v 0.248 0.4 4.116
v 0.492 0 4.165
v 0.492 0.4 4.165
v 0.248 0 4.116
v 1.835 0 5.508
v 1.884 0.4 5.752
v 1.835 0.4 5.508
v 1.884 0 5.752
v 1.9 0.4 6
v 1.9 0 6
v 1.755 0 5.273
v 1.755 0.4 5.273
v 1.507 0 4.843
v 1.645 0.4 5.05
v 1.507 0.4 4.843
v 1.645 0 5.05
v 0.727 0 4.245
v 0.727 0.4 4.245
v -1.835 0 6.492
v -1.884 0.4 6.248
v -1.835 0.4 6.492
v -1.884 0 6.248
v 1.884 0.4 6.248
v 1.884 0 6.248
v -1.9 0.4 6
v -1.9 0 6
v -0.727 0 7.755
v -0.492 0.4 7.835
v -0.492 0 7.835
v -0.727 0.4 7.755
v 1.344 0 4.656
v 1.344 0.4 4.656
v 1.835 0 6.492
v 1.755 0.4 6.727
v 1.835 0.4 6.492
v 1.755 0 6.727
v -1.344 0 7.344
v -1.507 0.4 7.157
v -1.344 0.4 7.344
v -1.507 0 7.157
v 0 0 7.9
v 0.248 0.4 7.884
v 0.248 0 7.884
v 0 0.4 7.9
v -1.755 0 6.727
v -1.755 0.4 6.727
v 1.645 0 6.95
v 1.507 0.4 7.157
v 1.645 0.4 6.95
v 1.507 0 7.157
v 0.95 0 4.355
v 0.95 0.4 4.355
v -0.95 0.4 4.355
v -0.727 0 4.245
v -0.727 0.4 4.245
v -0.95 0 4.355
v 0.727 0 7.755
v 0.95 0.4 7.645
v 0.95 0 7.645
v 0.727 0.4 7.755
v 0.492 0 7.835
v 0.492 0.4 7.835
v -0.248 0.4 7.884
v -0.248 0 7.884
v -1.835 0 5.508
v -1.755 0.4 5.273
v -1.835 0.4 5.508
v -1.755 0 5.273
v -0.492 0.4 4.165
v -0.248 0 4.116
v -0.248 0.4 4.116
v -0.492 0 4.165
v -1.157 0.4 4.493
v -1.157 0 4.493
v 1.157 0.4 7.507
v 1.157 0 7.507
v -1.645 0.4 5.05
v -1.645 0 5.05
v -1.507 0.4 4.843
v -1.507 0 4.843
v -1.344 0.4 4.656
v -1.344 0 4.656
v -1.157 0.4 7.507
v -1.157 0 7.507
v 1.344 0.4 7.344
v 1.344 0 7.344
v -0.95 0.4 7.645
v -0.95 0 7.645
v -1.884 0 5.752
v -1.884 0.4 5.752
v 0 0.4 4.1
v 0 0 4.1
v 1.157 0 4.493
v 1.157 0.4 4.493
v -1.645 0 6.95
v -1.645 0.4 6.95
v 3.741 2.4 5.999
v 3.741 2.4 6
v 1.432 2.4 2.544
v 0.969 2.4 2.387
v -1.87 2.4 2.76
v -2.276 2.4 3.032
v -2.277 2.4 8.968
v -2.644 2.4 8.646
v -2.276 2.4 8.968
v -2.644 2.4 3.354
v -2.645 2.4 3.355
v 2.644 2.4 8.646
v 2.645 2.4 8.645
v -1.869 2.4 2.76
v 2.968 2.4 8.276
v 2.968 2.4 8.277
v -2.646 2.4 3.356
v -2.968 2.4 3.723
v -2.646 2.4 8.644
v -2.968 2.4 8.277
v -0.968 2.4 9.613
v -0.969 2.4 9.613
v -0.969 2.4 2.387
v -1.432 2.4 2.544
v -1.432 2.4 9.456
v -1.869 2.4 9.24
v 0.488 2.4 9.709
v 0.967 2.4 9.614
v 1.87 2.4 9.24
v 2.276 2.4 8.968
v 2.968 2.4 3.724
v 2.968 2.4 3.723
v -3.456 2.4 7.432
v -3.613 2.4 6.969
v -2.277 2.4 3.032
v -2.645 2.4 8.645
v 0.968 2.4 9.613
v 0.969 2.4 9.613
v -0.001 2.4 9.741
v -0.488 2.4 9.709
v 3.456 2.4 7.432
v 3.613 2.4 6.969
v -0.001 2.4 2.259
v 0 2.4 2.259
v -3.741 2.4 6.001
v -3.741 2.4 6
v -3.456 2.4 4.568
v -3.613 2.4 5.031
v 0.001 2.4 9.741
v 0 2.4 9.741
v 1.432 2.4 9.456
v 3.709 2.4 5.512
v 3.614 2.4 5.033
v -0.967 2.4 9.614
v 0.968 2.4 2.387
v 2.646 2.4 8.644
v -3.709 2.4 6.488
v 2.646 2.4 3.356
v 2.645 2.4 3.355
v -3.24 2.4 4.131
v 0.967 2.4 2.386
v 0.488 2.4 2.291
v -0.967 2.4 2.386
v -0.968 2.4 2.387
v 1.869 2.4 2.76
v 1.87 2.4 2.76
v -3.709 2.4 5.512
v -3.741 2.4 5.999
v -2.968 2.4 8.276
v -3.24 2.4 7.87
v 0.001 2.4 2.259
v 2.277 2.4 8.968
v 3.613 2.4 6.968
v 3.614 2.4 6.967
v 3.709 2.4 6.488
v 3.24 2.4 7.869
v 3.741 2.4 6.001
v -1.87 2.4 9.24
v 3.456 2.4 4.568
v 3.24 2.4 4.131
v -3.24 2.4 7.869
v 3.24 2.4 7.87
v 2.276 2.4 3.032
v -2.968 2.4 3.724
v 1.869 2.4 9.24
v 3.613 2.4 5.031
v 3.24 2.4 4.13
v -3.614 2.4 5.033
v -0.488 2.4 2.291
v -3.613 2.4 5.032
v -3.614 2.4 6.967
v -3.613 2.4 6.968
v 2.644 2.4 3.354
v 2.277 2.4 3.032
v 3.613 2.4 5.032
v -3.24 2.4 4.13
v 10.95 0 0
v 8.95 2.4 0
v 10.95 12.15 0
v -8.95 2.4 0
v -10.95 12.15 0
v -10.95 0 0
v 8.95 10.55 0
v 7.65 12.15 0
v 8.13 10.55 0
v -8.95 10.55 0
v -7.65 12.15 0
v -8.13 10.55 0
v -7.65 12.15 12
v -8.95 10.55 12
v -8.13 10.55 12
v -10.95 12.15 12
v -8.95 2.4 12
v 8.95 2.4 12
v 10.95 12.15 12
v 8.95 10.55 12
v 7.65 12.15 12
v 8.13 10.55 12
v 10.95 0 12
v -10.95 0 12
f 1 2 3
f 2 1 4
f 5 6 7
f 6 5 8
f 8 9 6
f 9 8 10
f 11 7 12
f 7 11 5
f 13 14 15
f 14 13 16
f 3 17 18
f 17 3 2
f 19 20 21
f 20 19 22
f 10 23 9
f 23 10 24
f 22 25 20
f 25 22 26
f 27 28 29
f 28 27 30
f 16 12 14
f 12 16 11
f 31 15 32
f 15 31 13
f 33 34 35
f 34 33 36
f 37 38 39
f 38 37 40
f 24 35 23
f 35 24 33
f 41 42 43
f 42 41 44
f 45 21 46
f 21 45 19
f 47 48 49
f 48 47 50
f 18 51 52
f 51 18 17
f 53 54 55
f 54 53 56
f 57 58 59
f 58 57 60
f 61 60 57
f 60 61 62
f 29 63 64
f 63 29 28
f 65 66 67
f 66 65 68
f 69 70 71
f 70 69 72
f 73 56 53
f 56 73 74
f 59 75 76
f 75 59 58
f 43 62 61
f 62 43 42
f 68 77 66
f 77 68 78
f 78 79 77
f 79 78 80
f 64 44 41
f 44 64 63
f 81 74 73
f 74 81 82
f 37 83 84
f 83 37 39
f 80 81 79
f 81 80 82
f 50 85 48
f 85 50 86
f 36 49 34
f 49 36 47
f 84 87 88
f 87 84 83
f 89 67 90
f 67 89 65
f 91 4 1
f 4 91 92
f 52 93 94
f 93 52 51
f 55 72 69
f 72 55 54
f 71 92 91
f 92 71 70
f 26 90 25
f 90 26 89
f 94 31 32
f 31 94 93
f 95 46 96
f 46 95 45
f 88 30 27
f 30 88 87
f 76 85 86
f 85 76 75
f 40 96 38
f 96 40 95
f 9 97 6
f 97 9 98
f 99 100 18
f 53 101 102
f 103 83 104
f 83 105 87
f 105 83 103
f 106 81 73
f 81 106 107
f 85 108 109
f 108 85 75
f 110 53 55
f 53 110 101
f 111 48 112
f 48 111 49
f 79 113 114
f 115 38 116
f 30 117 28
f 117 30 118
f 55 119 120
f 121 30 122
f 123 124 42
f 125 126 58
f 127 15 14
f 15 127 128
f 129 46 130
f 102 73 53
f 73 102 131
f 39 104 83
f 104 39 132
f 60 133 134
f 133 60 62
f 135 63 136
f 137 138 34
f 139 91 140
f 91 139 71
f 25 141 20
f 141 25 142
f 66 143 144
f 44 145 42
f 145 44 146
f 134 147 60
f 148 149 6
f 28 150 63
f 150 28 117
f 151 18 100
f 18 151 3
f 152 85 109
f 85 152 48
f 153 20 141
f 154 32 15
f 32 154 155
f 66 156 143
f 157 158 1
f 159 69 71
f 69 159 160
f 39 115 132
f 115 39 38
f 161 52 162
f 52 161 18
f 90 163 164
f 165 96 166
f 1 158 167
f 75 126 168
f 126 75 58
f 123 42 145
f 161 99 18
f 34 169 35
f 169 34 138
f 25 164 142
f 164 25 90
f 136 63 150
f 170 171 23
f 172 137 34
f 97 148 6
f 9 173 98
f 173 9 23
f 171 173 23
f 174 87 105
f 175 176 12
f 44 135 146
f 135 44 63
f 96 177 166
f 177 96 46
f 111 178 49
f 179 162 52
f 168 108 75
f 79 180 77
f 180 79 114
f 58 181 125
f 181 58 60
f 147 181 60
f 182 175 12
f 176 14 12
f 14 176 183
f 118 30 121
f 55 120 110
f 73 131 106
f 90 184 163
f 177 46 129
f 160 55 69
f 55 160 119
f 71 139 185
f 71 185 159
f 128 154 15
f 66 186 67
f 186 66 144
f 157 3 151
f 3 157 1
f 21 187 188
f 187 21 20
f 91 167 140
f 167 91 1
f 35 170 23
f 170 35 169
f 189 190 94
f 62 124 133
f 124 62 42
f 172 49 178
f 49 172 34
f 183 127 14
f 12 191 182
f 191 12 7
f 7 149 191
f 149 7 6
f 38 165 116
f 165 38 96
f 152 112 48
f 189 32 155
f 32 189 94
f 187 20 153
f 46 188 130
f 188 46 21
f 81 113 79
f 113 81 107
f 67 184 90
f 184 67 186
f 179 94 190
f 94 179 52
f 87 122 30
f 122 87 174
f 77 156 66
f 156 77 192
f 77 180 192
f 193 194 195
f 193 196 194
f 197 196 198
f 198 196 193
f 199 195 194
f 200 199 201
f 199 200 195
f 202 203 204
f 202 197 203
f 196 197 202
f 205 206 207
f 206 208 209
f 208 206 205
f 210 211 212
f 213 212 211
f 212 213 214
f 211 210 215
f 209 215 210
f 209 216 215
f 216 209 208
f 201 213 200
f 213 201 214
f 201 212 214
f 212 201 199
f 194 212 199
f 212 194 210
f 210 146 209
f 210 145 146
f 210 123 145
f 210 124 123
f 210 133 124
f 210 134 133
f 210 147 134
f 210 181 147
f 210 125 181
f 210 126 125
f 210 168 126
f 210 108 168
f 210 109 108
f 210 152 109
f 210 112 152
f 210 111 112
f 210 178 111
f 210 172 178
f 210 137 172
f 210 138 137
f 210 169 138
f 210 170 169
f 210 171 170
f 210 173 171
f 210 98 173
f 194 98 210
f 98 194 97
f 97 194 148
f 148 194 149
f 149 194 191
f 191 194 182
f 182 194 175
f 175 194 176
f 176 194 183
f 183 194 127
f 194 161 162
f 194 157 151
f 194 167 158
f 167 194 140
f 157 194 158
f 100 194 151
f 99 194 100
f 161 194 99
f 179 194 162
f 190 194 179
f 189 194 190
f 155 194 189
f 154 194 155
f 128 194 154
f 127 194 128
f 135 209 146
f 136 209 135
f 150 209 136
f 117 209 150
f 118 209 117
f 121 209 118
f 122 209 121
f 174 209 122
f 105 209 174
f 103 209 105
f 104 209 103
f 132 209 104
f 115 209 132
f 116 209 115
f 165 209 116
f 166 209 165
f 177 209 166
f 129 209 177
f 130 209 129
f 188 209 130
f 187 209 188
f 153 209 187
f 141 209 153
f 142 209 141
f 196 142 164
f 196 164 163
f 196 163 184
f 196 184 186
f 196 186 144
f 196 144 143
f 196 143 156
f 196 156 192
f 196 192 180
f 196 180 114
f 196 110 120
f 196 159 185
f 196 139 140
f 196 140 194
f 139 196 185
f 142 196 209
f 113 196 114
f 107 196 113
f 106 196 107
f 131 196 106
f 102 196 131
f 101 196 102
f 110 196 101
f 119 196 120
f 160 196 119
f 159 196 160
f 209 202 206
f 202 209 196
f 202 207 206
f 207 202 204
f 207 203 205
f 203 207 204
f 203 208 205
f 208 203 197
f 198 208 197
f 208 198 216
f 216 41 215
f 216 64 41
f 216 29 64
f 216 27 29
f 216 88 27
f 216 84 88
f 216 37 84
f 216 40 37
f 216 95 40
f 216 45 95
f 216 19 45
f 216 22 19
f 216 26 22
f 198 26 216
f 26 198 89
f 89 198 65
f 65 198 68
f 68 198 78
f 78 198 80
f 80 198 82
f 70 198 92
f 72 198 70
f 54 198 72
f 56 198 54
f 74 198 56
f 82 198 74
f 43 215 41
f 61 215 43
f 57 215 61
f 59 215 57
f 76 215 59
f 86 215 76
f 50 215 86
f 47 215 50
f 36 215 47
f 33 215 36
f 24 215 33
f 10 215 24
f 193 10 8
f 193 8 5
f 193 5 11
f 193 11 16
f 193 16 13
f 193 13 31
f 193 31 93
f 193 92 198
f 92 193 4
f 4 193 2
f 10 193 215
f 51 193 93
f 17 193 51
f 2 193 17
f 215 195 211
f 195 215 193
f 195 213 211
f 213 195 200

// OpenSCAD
// ============================================
// Nacvakávací úchyt pro LED profil T-LED N14
// (nástupce N8, vnější průřez ~17.4 x 8 mm)
// ============================================

/* [Profil] */
profile_w = 17.4;   // šířka profilu (vnější)
profile_h = 8.0;    // výška profilu (vnější)
clearance = 0.25;   // vůle na stranu (PETG ~0.25, PLA ~0.2)

/* [Spona] */
clip_len  = 12;     // délka spony podél profilu
wall      = 2.0;    // tloušťka bočních stěn
base_t    = 2.4;    // tloušťka dna (pod profilem)
lip       = 1.3;    // jak hluboko pacička přesahuje přes přední hranu
lip_t     = 1.6;    // tloušťka pacičky
chamfer   = 1.2;    // náběh na pacičce pro snadné zacvaknutí

/* [Šroub] */
screw_d   = 3.8;    // průměr díry (vrut 3.5)
head_d    = 7.5;    // průměr zahloubení hlavy
head_h    = 2.0;    // hloubka kuželového zahloubení

/* [Kvalita] */
$fn = 48;

// --- odvozené rozměry ---
slot_w = profile_w + 2*clearance;          // vnitřní šířka drážky
slot_h = profile_h + 0.15;                 // vnitřní výška drážky
total_w = slot_w + 2*wall;
total_h = base_t + slot_h + lip_t;

difference() {
    // tělo: 2D průřez vytažený do délky
    linear_extrude(clip_len)
        body_profile();

    // díra na vrut + kuželové zahloubení (zespodu skrz dno)
    translate([0, 0, clip_len/2]) rotate([-90, 0, 0]) {
        translate([0, 0, -1])
            cylinder(d = screw_d, h = base_t + 2);
        // záhlub uvnitř drážky (šroubuje se zevnitř, hlava pod páskem)
        translate([0, 0, base_t - head_h])
            cylinder(d1 = screw_d, d2 = head_d, h = head_h + 0.01);
    }
}

module body_profile() {
    // souřadnice: X = šířka, Y = výška; dno dole
    union() {
        // dno
        translate([-total_w/2, 0])
            square([total_w, base_t]);
        // boční stěny
        for (s = [-1, 1])
            translate([s > 0 ? slot_w/2 : -slot_w/2 - wall, 0])
                square([wall, base_t + slot_h + lip_t]);
        // pacičky s náběhem
        for (s = [-1, 1])
            mirror([s < 0 ? 1 : 0, 0])
                polygon([
                    [slot_w/2,            base_t + slot_h + lip_t],
                    [slot_w/2 - lip,      base_t + slot_h + lip_t],
                    [slot_w/2 - lip + chamfer*0.4, base_t + slot_h + lip_t - lip_t],
                    [slot_w/2,            base_t + slot_h]
                ]);
    }
}
